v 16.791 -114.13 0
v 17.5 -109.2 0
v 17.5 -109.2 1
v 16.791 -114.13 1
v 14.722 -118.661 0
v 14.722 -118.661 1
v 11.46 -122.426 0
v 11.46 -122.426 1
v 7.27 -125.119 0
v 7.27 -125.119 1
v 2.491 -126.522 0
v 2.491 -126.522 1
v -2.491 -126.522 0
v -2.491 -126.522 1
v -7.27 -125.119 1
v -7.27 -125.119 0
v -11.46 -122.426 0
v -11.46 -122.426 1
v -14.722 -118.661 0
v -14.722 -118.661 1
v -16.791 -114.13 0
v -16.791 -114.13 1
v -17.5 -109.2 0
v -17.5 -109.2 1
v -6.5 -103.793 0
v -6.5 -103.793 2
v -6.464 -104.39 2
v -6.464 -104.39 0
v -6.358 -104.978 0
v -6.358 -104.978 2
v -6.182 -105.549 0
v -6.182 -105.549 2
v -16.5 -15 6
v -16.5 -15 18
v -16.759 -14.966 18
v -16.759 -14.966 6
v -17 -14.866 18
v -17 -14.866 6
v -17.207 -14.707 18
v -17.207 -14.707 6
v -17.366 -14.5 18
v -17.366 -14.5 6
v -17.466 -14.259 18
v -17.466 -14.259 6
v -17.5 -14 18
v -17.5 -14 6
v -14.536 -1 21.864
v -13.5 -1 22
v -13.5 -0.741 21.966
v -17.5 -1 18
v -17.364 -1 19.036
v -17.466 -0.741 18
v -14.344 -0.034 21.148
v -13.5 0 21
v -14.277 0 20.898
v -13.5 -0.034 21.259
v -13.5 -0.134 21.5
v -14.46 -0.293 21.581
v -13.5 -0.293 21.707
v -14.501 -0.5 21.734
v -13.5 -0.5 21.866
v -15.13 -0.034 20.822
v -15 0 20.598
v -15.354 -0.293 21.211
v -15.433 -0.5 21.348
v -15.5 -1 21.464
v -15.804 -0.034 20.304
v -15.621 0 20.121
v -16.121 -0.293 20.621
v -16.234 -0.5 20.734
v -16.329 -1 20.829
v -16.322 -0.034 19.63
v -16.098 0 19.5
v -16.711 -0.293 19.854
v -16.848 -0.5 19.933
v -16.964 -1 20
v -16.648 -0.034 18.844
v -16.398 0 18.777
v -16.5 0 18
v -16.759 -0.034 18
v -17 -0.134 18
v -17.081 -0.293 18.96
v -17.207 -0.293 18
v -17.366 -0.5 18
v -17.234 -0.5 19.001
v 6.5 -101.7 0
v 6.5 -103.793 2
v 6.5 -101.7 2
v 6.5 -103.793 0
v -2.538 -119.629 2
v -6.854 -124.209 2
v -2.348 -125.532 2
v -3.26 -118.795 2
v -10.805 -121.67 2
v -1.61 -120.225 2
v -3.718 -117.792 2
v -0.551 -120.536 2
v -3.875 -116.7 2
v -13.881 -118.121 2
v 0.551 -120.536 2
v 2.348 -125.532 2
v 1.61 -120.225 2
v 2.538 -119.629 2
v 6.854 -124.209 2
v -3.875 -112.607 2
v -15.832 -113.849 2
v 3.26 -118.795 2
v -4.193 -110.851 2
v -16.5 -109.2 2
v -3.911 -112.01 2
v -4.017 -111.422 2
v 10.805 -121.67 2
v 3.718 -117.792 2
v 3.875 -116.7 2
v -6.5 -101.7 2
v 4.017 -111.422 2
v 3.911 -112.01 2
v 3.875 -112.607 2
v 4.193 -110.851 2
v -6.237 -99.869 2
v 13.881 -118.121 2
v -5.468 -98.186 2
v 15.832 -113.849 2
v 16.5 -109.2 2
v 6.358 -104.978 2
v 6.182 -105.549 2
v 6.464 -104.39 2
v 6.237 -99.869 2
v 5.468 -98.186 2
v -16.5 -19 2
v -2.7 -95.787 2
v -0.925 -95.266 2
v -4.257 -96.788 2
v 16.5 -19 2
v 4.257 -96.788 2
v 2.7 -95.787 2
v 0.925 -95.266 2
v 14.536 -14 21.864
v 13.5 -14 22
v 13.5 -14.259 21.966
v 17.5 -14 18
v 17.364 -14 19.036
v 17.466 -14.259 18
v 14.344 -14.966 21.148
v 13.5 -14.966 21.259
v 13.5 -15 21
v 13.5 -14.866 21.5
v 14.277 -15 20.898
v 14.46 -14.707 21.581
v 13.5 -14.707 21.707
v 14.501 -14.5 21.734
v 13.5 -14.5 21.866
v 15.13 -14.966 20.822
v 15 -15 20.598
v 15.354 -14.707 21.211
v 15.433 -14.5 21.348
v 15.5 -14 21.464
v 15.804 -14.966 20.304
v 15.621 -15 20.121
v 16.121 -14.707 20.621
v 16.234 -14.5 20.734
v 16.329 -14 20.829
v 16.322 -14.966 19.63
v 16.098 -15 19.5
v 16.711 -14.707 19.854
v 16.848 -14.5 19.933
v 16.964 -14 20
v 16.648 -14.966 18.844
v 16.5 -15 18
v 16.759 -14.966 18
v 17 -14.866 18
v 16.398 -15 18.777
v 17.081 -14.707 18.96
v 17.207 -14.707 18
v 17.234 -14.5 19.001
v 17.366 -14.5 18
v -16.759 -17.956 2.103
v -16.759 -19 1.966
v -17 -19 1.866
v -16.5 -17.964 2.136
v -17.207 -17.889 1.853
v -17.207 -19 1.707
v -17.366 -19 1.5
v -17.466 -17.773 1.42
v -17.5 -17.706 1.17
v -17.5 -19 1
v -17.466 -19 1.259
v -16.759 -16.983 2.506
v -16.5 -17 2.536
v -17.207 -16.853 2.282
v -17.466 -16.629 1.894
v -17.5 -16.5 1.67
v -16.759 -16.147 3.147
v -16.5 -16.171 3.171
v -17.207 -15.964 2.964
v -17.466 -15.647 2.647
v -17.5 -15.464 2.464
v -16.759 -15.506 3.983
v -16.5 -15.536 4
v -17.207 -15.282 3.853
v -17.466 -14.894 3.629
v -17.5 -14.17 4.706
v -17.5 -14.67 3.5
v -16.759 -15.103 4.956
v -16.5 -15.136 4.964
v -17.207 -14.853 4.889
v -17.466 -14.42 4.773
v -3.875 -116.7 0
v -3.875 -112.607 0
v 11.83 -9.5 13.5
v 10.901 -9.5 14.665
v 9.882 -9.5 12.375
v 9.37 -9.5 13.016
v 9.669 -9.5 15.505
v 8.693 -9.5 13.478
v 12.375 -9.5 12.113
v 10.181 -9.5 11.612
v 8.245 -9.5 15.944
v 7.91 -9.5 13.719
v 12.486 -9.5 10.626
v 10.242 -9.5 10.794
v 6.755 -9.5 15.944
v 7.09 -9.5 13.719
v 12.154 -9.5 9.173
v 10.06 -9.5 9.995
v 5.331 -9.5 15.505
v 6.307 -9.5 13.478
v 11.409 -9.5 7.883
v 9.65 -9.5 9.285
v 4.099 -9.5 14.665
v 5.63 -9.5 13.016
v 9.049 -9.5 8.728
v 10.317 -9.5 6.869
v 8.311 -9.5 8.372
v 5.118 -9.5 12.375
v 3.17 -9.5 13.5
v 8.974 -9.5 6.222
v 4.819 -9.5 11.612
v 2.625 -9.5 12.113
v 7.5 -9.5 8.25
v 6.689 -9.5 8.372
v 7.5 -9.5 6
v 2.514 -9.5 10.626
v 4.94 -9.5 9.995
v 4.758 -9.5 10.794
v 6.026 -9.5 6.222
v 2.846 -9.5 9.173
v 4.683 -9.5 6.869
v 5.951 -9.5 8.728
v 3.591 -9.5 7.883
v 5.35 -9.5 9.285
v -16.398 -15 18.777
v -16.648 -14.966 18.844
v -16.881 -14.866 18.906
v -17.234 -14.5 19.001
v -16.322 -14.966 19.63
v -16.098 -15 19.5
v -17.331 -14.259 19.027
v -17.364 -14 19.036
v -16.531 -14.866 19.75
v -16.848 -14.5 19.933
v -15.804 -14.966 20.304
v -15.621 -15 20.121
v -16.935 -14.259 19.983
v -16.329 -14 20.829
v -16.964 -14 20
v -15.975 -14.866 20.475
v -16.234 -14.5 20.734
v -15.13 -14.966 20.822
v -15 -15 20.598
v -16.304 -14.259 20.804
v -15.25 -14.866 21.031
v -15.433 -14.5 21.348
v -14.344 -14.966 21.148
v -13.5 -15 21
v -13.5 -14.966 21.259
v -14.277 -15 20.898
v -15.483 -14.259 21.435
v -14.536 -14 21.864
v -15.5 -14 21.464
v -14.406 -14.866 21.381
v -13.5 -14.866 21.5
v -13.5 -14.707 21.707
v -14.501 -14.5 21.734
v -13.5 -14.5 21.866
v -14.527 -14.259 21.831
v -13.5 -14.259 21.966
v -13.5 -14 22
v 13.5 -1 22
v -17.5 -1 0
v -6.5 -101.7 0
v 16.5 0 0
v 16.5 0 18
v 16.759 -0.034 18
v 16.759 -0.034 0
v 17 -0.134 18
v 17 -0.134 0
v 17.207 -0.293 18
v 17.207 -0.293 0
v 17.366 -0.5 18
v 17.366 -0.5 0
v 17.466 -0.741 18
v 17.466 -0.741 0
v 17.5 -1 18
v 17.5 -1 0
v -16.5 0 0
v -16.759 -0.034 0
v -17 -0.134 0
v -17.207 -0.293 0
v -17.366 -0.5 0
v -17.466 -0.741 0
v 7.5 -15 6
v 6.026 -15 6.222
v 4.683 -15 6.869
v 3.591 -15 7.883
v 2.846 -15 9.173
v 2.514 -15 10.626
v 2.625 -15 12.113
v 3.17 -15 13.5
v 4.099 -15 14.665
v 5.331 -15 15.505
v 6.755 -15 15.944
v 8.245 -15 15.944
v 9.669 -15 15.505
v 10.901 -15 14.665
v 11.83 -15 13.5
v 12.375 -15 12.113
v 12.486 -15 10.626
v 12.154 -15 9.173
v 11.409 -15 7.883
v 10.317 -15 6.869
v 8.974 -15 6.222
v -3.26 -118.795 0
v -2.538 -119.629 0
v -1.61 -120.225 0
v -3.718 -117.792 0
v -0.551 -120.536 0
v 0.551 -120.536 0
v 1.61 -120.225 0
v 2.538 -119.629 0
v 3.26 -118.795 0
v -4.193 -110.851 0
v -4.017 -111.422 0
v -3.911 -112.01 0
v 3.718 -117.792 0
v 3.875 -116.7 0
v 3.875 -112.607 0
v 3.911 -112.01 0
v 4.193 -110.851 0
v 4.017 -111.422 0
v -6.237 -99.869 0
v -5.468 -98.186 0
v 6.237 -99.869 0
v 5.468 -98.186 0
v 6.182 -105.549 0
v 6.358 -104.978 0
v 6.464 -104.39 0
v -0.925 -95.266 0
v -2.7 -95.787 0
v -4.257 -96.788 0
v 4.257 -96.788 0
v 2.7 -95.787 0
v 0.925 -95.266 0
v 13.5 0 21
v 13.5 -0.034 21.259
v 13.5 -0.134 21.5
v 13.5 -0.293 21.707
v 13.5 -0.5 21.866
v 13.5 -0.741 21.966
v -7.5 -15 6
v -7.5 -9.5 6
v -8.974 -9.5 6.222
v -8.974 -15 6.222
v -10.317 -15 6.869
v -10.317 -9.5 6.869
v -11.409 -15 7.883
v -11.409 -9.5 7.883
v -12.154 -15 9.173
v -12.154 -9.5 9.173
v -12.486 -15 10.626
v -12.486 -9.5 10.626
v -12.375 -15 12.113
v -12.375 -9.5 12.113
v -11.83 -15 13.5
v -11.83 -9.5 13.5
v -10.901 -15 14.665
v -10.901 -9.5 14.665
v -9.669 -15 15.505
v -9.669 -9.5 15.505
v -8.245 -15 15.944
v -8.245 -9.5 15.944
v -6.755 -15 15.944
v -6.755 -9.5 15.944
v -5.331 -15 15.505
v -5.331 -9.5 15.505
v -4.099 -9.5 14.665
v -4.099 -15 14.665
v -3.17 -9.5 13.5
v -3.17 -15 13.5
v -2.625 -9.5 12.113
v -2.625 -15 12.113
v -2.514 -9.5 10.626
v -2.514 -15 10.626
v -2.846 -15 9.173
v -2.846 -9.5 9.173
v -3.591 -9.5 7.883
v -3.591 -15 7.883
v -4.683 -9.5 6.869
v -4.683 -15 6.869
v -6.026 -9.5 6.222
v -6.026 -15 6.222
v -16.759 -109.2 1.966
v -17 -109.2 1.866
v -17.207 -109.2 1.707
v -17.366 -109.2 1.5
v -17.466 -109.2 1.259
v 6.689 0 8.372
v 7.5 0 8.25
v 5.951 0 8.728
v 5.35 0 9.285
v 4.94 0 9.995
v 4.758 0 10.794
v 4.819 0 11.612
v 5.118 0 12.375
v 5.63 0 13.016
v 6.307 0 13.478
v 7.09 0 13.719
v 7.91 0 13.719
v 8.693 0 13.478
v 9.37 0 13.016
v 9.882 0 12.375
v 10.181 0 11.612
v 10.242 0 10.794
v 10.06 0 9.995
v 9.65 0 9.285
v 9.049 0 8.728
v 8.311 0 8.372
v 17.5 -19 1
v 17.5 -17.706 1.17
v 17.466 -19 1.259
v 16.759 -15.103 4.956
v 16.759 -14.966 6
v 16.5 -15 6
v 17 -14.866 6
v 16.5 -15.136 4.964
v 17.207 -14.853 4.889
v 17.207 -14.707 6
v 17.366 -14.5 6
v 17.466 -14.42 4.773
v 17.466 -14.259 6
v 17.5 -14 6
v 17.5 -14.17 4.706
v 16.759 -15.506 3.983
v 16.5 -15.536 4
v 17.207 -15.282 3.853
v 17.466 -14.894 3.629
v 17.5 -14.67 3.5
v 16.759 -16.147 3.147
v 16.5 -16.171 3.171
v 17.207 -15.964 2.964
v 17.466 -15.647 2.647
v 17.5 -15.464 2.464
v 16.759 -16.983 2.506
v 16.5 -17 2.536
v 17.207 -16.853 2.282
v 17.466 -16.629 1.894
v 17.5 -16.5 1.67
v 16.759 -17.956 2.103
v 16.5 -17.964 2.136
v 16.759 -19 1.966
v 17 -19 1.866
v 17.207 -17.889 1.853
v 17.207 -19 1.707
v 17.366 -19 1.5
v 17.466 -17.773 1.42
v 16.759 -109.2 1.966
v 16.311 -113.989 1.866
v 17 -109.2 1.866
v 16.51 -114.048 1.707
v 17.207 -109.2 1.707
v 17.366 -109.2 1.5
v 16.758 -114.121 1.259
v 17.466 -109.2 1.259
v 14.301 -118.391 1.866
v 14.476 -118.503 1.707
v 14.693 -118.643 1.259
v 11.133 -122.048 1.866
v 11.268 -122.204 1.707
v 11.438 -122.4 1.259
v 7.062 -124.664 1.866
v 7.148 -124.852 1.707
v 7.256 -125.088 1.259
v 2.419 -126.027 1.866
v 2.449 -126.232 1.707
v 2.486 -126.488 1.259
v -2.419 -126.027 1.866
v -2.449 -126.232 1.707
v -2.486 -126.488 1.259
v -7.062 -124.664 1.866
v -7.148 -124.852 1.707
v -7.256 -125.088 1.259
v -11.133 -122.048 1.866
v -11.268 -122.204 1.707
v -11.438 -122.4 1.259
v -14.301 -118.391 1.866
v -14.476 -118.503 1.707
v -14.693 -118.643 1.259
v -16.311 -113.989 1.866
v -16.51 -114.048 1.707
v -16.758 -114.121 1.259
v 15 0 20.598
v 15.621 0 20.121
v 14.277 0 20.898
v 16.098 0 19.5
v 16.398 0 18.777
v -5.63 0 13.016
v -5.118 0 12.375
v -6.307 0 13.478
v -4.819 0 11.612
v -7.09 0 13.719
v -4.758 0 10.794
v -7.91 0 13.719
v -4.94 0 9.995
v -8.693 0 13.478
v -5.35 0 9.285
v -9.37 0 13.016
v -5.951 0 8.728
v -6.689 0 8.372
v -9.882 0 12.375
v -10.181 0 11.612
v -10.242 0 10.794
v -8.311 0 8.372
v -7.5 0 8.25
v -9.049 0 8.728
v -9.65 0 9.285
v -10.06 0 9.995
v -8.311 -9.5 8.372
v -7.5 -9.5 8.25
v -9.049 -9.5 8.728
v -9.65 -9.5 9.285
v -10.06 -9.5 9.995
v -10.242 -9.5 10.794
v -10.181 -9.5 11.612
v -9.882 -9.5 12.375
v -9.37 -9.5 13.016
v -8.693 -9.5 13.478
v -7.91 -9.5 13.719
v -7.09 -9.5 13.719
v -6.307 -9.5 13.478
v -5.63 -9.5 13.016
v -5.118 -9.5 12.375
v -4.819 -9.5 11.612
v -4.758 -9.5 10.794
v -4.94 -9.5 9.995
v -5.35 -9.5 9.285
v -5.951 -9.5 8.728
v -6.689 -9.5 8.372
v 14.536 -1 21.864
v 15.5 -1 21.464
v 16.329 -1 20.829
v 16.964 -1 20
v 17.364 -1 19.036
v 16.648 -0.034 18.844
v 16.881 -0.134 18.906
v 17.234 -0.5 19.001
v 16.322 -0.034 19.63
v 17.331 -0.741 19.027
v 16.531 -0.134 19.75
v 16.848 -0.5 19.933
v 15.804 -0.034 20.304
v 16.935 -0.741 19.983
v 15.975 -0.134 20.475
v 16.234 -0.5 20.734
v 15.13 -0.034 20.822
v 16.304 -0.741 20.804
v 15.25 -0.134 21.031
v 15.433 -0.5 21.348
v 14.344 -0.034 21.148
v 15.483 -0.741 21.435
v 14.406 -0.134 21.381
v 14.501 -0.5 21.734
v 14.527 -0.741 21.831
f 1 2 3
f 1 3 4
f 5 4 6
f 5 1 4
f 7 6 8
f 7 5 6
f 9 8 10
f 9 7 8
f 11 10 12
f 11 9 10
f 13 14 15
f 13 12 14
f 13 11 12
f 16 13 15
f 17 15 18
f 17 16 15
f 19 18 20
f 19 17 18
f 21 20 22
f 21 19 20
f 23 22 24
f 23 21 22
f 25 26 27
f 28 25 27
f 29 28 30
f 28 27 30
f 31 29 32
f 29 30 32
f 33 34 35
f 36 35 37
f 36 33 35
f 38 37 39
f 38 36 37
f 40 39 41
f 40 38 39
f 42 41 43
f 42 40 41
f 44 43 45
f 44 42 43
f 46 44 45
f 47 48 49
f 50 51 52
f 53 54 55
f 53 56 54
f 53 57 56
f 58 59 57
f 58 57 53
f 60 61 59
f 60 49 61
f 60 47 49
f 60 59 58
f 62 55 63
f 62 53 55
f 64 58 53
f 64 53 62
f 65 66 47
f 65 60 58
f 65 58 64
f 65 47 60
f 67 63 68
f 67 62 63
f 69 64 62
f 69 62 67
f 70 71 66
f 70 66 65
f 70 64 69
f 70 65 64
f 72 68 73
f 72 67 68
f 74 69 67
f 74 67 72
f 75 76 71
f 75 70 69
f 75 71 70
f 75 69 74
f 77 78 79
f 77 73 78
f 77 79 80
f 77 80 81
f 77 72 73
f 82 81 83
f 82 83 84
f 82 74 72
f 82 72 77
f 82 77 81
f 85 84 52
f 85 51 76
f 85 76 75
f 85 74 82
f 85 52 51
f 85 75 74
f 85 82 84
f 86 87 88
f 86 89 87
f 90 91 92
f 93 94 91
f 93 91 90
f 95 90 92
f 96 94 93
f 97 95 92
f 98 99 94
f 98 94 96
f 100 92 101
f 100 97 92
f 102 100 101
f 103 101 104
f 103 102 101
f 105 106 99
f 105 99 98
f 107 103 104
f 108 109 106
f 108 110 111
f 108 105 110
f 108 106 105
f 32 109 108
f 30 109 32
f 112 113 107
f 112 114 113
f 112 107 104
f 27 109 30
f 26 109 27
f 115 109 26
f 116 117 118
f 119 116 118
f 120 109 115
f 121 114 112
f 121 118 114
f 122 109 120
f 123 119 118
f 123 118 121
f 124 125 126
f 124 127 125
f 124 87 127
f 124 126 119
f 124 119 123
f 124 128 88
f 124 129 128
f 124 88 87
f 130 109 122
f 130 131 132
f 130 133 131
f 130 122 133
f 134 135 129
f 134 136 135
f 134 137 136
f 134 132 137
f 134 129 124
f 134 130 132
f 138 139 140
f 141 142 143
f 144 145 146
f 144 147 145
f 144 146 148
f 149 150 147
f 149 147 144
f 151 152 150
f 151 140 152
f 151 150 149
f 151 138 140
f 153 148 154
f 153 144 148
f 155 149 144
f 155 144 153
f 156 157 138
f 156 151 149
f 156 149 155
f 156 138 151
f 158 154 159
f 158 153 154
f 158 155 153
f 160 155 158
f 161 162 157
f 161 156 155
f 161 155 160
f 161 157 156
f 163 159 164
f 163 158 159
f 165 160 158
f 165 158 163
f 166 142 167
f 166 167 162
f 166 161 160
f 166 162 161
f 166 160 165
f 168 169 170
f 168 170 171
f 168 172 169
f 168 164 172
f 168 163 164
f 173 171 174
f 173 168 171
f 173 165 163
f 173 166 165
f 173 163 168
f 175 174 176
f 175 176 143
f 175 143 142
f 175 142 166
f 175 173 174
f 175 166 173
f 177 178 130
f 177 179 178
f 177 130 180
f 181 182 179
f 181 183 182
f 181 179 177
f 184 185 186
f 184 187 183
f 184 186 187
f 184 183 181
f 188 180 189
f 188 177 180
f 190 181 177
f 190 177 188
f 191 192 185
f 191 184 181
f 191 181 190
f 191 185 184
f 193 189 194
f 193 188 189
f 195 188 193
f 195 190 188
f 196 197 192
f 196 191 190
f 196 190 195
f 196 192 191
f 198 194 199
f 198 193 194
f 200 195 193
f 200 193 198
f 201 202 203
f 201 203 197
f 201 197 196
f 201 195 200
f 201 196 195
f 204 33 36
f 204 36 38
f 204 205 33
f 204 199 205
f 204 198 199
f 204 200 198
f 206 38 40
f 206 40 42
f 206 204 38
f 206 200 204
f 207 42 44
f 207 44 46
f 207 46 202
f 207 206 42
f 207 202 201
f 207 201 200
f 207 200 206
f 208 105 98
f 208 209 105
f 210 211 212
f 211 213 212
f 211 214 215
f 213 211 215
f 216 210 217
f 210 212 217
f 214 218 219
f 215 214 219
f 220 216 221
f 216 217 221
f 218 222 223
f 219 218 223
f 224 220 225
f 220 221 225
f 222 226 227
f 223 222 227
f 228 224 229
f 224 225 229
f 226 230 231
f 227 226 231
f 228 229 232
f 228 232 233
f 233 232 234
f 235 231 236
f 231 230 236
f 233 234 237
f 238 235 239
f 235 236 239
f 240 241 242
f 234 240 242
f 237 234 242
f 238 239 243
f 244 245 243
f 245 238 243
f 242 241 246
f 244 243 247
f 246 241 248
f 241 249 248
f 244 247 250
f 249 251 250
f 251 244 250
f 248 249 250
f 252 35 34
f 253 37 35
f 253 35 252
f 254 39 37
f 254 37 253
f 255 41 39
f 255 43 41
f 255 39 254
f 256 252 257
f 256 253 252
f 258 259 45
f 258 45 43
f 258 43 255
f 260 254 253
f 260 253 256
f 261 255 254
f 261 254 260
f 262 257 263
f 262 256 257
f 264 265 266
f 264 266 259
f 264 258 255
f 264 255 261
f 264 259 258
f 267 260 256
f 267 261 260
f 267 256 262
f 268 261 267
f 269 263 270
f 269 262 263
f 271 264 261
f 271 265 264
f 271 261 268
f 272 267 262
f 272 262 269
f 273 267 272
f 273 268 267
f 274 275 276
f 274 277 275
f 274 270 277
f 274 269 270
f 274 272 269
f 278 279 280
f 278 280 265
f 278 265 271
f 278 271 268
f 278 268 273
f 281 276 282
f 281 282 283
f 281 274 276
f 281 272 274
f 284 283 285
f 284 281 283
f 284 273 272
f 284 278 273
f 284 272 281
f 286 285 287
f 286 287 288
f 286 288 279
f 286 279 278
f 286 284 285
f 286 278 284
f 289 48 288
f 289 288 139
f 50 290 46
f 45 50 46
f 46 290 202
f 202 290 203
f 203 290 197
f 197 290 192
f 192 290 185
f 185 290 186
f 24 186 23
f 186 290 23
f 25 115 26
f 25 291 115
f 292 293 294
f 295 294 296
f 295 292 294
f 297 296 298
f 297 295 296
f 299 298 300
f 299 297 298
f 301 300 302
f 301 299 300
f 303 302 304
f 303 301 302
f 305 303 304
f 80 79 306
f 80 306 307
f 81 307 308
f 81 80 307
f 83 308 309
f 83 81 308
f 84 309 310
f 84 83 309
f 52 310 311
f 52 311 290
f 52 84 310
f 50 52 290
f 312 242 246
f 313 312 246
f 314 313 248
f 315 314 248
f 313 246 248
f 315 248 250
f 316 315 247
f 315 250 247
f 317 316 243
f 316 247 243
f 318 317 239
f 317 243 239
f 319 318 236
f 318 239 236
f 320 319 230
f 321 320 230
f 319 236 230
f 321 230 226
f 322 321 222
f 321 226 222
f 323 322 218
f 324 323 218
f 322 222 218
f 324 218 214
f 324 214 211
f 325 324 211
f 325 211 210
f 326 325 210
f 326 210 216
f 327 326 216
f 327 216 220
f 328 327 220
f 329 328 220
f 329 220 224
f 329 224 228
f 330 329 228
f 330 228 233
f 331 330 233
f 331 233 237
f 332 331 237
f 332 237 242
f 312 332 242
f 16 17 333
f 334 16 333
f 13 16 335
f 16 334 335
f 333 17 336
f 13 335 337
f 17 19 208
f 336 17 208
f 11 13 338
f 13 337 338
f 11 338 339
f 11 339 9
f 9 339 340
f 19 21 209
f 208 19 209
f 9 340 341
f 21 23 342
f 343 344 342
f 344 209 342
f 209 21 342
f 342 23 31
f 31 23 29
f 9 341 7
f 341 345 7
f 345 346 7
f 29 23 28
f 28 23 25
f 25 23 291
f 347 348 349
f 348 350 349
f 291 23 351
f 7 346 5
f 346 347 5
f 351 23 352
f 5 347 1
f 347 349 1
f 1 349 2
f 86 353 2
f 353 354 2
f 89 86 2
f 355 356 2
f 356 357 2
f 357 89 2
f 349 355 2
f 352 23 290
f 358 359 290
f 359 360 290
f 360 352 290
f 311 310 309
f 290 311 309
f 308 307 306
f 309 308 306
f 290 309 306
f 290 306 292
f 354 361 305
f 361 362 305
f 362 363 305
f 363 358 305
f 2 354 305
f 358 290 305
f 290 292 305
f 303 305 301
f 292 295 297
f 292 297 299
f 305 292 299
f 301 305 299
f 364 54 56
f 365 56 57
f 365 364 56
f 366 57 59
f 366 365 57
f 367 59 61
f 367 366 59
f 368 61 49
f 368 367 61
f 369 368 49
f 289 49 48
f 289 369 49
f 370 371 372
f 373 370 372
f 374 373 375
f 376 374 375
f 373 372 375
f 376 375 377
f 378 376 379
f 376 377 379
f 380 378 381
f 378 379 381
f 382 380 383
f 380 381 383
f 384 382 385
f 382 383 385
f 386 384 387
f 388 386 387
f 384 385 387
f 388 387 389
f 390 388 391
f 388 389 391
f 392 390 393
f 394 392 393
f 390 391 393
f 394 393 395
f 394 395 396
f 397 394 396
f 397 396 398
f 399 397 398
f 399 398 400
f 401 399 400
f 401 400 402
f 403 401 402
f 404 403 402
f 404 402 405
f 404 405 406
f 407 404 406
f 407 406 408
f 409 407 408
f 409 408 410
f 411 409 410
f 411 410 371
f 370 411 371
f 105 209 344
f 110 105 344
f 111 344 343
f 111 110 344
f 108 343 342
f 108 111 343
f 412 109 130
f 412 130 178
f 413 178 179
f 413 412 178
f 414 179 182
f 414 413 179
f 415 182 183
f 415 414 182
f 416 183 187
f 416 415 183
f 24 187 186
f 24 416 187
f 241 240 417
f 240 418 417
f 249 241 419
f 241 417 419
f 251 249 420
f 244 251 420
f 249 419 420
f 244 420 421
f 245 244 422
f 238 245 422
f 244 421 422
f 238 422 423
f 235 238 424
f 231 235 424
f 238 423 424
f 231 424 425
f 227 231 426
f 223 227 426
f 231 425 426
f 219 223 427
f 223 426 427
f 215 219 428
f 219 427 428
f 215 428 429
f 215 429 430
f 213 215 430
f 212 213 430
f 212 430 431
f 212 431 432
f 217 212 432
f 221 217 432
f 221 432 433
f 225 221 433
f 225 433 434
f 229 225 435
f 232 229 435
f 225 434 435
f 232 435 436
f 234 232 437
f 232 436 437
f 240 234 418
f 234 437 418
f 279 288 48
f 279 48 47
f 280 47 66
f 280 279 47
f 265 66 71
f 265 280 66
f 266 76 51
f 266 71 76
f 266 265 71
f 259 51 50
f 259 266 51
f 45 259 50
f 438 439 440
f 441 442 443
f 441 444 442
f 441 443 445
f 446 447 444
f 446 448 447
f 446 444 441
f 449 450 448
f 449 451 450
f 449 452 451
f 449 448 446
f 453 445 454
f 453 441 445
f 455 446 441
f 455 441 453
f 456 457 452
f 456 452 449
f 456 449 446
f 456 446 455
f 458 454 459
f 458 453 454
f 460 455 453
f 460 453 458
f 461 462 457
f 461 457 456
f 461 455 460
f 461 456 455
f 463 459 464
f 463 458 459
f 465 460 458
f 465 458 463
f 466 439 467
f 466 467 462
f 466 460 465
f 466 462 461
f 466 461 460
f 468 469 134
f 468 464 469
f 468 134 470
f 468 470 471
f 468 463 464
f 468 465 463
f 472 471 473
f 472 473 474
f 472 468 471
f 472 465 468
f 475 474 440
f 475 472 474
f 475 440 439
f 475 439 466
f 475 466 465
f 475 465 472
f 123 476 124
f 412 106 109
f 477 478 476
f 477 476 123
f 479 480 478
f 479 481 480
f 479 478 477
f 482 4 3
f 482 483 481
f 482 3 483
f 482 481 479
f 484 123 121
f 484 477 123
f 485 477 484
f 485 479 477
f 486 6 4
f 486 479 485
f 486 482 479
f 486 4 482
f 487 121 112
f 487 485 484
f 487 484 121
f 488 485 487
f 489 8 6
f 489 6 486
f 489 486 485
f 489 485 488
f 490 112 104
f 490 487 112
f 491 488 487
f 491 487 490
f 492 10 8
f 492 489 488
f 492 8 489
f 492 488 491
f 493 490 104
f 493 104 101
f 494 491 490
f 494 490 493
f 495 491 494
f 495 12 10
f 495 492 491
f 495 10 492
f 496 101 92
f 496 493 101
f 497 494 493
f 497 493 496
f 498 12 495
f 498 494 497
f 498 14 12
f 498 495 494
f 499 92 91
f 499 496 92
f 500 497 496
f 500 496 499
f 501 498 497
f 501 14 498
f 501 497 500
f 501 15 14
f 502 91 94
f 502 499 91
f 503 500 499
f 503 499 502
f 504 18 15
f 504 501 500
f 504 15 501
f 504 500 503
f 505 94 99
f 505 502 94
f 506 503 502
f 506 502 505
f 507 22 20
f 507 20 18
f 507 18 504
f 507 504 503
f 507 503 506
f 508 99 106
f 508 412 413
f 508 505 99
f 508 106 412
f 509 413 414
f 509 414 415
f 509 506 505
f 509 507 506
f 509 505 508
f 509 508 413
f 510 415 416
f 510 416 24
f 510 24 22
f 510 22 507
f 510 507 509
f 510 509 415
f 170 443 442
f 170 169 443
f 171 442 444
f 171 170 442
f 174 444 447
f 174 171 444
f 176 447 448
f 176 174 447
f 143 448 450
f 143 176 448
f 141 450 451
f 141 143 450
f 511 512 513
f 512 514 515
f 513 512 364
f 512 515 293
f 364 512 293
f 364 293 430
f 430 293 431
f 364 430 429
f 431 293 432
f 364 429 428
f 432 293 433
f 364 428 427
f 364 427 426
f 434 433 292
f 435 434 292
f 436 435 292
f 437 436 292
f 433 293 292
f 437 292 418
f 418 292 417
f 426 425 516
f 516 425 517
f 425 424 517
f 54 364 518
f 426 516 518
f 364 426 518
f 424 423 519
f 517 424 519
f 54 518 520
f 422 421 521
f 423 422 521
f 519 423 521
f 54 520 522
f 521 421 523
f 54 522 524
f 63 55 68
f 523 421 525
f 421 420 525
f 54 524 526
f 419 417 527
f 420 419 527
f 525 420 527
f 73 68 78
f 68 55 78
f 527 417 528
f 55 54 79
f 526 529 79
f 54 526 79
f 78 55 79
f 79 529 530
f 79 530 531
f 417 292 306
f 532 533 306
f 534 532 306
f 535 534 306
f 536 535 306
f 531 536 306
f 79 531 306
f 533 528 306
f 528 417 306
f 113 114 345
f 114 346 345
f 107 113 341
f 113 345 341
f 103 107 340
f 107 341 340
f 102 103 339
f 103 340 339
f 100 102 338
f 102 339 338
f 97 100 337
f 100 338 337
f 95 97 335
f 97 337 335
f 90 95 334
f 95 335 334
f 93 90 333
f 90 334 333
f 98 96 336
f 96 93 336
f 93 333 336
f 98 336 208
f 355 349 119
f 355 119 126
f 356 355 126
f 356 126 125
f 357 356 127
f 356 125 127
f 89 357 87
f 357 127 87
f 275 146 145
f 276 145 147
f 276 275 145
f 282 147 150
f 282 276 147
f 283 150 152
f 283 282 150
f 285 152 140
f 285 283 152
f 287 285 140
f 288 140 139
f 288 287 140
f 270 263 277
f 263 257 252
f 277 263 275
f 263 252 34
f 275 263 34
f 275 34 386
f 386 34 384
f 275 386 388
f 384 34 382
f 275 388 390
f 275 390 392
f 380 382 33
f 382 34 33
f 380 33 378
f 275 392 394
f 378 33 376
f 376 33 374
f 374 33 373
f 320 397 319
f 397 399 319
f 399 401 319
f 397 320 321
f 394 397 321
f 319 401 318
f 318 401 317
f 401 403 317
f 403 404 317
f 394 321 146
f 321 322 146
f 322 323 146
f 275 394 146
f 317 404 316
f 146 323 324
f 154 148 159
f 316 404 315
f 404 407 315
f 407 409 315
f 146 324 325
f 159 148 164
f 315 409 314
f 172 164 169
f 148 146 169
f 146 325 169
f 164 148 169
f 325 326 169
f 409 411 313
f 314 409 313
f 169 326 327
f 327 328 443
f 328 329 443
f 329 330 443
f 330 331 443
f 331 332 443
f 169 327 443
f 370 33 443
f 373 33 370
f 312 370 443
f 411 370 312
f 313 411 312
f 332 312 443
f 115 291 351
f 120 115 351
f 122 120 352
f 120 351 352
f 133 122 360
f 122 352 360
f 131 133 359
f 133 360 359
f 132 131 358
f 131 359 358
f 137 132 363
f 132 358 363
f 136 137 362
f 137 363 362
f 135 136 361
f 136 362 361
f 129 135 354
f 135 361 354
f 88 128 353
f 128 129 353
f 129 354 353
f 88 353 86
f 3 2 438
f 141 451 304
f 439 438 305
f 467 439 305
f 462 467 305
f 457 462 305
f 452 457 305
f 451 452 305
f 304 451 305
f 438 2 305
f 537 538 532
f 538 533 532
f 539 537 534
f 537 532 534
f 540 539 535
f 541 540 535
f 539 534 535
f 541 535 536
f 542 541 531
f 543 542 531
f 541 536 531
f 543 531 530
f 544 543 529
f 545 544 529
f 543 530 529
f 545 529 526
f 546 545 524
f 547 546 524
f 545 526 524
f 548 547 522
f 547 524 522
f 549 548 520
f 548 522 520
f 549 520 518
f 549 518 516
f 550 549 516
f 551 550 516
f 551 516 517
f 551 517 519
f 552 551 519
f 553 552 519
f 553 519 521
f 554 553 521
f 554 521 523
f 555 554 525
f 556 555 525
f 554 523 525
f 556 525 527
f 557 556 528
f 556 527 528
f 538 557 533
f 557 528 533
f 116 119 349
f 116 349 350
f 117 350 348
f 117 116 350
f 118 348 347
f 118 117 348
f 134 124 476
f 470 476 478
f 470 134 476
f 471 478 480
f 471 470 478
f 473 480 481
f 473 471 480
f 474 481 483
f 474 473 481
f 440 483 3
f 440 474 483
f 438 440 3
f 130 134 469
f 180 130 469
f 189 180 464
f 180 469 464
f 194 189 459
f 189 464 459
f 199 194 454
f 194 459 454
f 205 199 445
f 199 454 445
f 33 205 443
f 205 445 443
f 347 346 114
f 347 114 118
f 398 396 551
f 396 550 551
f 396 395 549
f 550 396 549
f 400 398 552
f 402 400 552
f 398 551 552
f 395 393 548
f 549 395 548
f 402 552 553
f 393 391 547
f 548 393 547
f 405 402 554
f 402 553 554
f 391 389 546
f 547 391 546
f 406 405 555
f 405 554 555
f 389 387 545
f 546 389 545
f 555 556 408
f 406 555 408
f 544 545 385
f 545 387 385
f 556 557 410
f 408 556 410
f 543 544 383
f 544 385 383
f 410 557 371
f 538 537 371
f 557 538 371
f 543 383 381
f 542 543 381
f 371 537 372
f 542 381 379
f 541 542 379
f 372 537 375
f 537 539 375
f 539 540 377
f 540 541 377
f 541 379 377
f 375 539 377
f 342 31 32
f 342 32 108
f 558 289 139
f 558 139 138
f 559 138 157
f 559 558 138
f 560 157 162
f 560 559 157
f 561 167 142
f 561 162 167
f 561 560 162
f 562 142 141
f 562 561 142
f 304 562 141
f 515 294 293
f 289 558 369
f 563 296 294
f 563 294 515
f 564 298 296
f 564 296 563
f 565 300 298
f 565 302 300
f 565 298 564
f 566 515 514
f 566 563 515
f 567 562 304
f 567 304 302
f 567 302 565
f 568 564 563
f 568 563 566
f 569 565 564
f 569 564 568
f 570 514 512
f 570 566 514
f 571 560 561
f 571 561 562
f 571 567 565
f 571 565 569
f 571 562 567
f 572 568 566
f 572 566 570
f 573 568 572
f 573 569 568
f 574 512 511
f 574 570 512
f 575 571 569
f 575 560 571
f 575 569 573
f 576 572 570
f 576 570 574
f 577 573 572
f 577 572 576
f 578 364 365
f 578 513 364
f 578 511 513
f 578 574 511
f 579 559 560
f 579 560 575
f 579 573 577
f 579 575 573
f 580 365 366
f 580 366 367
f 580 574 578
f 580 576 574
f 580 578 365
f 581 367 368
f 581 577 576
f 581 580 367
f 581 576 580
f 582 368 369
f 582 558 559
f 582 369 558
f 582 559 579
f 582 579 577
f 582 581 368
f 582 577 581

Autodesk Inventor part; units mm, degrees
ref_plane "YZ Plane" through (0, 0, 0) normal (1, 0, 0) x (0, 1, 0)
ref_plane "XZ Plane" through (0, 0, 0) normal (0, 1, 0) x (-1, 0, 0)
ref_plane "XY Plane" through (0, 0, 0) normal (0, 0, 1) x (1, 0, 0)
sketch "Esquisse1" plane through (0, 0, 0) normal (0, 0, 1) x (1, 0, 0)
  line L0 (17.5, -109.2) -> (17.5, 0)
  line L1 (17.5, 0) -> (-17.5, 0)
  line L2 (-17.5, 0) -> (-17.5, -109.2)
  arc A0 (-17.5, -109.2) -> (17.5, -109.2) centre (0, -109.2) ccw
  arc A1 (-3.875, -116.7) -> (3.875, -116.7) centre (0, -116.7) ccw
  arc A2 (6.5, -101.7) -> (-6.5, -101.7) centre (0, -101.7) ccw
  line L3 (-3.875, -111.7) -> (-3.875, -116.7)
  line L4 (3.875, -116.7) -> (3.875, -111.7)
  line L5 (-6.5, -101.7) -> (-6.5, -104.7)
  line L6 (-6.5, -104.7) -> (-3.875, -111.7)
  line L7 (3.875, -111.7) -> (6.5, -104.7)
  line L8 (6.5, -104.7) -> (6.5, -101.7)
  point P0 (0, 0)
  point P1 (0, 0)
  dimension "d0" = 35
  dimension "d1" = 126.7
  dimension "d3" = 3
  dimension "d4" = 6.5
  dimension "d5" = 5
  dimension "d6" = 15
  dimension "d7" = 116.7
  dimension "d8" = 3.875
extrude "Embase" add sketch "Esquisse1" along normal blind 2
sketch "Esquisse2" plane through (0, 0, 2) normal (0, 0, 1) x (1, 0, 0)
  line L0 (-17.5, -15) -> (17.5, -15)
  line L1 (17.5, -15) -> (17.5, 0)
  line L2 (17.5, 0) -> (-17.5, 0)
  line L3 (-17.5, 0) -> (-17.5, -15)
  line L4 (17.5, 0) -> (-17.5, 0) projected
  line L5 (-17.5, 0) -> (-17.5, -109.2) projected
  line L6 (17.5, -109.2) -> (17.5, 0) projected
  point P0 (0, 0)
  dimension "d11" = 15
extrude "Support" add sketch "Esquisse2" along normal blind 20
sketch "Esquisse3" plane through (-17.5, -15, 2) normal (0, -1, 0) x (1, 0, 0)
  line L0 (0, -2) -> (0, 20) projected
  point P0 (17.5, -2)
  point P1 (10, 9)
  point P2 (25, 9)
  point P3 (0, 9)
  dimension "Entraxe" = 15
  dimension "d15" = 7.5
hole "Passage vis" at (-7.5, -15, 11) at (7.5, -15, 11) direction (0, 1, 0) diameter 5.5 end through all counterbore diameter 10 counterbore depth 5.5 clearance for "Vis d'assemblage à tête hexagonale ISO 24017" size "M5" standard "ISO"
fillet "Congé1" radius 4 3 edges at (-17.5, -7.5, 22) (17.5, -7.5, 22) (0, -15, 2)
fillet "Congé1" radius 5 4 edges at (3.875, -111.7, 1) (6.5, -104.7, 1) (-6.5, -104.7, 1) (-3.875, -111.7, 1)
fillet "Congé2" radius 1 15 edges at (16.3286, -15, 20.8286) (17.5, -15, 12) (17.5, -16.1714, 3.1714) (17.5, -64.0997, 2) (0, -126.7, 2) (-17.5, -64.0998, 2) (-17.5, -16.1714, 3.1714) (-17.5, -15, 12) (-16.3286, -15, 20.8286) (0, -15, 22) (-16.3286, 0, 20.8286) (-17.5, 0, 9.0003) (16.3286, 0, 20.8286) (17.5, 0, 9.0003) (0, 0, 22)
equation "\"d15\" = 0.5 * Entraxe"
properties part number "Bras" material "Plastique ABS"
